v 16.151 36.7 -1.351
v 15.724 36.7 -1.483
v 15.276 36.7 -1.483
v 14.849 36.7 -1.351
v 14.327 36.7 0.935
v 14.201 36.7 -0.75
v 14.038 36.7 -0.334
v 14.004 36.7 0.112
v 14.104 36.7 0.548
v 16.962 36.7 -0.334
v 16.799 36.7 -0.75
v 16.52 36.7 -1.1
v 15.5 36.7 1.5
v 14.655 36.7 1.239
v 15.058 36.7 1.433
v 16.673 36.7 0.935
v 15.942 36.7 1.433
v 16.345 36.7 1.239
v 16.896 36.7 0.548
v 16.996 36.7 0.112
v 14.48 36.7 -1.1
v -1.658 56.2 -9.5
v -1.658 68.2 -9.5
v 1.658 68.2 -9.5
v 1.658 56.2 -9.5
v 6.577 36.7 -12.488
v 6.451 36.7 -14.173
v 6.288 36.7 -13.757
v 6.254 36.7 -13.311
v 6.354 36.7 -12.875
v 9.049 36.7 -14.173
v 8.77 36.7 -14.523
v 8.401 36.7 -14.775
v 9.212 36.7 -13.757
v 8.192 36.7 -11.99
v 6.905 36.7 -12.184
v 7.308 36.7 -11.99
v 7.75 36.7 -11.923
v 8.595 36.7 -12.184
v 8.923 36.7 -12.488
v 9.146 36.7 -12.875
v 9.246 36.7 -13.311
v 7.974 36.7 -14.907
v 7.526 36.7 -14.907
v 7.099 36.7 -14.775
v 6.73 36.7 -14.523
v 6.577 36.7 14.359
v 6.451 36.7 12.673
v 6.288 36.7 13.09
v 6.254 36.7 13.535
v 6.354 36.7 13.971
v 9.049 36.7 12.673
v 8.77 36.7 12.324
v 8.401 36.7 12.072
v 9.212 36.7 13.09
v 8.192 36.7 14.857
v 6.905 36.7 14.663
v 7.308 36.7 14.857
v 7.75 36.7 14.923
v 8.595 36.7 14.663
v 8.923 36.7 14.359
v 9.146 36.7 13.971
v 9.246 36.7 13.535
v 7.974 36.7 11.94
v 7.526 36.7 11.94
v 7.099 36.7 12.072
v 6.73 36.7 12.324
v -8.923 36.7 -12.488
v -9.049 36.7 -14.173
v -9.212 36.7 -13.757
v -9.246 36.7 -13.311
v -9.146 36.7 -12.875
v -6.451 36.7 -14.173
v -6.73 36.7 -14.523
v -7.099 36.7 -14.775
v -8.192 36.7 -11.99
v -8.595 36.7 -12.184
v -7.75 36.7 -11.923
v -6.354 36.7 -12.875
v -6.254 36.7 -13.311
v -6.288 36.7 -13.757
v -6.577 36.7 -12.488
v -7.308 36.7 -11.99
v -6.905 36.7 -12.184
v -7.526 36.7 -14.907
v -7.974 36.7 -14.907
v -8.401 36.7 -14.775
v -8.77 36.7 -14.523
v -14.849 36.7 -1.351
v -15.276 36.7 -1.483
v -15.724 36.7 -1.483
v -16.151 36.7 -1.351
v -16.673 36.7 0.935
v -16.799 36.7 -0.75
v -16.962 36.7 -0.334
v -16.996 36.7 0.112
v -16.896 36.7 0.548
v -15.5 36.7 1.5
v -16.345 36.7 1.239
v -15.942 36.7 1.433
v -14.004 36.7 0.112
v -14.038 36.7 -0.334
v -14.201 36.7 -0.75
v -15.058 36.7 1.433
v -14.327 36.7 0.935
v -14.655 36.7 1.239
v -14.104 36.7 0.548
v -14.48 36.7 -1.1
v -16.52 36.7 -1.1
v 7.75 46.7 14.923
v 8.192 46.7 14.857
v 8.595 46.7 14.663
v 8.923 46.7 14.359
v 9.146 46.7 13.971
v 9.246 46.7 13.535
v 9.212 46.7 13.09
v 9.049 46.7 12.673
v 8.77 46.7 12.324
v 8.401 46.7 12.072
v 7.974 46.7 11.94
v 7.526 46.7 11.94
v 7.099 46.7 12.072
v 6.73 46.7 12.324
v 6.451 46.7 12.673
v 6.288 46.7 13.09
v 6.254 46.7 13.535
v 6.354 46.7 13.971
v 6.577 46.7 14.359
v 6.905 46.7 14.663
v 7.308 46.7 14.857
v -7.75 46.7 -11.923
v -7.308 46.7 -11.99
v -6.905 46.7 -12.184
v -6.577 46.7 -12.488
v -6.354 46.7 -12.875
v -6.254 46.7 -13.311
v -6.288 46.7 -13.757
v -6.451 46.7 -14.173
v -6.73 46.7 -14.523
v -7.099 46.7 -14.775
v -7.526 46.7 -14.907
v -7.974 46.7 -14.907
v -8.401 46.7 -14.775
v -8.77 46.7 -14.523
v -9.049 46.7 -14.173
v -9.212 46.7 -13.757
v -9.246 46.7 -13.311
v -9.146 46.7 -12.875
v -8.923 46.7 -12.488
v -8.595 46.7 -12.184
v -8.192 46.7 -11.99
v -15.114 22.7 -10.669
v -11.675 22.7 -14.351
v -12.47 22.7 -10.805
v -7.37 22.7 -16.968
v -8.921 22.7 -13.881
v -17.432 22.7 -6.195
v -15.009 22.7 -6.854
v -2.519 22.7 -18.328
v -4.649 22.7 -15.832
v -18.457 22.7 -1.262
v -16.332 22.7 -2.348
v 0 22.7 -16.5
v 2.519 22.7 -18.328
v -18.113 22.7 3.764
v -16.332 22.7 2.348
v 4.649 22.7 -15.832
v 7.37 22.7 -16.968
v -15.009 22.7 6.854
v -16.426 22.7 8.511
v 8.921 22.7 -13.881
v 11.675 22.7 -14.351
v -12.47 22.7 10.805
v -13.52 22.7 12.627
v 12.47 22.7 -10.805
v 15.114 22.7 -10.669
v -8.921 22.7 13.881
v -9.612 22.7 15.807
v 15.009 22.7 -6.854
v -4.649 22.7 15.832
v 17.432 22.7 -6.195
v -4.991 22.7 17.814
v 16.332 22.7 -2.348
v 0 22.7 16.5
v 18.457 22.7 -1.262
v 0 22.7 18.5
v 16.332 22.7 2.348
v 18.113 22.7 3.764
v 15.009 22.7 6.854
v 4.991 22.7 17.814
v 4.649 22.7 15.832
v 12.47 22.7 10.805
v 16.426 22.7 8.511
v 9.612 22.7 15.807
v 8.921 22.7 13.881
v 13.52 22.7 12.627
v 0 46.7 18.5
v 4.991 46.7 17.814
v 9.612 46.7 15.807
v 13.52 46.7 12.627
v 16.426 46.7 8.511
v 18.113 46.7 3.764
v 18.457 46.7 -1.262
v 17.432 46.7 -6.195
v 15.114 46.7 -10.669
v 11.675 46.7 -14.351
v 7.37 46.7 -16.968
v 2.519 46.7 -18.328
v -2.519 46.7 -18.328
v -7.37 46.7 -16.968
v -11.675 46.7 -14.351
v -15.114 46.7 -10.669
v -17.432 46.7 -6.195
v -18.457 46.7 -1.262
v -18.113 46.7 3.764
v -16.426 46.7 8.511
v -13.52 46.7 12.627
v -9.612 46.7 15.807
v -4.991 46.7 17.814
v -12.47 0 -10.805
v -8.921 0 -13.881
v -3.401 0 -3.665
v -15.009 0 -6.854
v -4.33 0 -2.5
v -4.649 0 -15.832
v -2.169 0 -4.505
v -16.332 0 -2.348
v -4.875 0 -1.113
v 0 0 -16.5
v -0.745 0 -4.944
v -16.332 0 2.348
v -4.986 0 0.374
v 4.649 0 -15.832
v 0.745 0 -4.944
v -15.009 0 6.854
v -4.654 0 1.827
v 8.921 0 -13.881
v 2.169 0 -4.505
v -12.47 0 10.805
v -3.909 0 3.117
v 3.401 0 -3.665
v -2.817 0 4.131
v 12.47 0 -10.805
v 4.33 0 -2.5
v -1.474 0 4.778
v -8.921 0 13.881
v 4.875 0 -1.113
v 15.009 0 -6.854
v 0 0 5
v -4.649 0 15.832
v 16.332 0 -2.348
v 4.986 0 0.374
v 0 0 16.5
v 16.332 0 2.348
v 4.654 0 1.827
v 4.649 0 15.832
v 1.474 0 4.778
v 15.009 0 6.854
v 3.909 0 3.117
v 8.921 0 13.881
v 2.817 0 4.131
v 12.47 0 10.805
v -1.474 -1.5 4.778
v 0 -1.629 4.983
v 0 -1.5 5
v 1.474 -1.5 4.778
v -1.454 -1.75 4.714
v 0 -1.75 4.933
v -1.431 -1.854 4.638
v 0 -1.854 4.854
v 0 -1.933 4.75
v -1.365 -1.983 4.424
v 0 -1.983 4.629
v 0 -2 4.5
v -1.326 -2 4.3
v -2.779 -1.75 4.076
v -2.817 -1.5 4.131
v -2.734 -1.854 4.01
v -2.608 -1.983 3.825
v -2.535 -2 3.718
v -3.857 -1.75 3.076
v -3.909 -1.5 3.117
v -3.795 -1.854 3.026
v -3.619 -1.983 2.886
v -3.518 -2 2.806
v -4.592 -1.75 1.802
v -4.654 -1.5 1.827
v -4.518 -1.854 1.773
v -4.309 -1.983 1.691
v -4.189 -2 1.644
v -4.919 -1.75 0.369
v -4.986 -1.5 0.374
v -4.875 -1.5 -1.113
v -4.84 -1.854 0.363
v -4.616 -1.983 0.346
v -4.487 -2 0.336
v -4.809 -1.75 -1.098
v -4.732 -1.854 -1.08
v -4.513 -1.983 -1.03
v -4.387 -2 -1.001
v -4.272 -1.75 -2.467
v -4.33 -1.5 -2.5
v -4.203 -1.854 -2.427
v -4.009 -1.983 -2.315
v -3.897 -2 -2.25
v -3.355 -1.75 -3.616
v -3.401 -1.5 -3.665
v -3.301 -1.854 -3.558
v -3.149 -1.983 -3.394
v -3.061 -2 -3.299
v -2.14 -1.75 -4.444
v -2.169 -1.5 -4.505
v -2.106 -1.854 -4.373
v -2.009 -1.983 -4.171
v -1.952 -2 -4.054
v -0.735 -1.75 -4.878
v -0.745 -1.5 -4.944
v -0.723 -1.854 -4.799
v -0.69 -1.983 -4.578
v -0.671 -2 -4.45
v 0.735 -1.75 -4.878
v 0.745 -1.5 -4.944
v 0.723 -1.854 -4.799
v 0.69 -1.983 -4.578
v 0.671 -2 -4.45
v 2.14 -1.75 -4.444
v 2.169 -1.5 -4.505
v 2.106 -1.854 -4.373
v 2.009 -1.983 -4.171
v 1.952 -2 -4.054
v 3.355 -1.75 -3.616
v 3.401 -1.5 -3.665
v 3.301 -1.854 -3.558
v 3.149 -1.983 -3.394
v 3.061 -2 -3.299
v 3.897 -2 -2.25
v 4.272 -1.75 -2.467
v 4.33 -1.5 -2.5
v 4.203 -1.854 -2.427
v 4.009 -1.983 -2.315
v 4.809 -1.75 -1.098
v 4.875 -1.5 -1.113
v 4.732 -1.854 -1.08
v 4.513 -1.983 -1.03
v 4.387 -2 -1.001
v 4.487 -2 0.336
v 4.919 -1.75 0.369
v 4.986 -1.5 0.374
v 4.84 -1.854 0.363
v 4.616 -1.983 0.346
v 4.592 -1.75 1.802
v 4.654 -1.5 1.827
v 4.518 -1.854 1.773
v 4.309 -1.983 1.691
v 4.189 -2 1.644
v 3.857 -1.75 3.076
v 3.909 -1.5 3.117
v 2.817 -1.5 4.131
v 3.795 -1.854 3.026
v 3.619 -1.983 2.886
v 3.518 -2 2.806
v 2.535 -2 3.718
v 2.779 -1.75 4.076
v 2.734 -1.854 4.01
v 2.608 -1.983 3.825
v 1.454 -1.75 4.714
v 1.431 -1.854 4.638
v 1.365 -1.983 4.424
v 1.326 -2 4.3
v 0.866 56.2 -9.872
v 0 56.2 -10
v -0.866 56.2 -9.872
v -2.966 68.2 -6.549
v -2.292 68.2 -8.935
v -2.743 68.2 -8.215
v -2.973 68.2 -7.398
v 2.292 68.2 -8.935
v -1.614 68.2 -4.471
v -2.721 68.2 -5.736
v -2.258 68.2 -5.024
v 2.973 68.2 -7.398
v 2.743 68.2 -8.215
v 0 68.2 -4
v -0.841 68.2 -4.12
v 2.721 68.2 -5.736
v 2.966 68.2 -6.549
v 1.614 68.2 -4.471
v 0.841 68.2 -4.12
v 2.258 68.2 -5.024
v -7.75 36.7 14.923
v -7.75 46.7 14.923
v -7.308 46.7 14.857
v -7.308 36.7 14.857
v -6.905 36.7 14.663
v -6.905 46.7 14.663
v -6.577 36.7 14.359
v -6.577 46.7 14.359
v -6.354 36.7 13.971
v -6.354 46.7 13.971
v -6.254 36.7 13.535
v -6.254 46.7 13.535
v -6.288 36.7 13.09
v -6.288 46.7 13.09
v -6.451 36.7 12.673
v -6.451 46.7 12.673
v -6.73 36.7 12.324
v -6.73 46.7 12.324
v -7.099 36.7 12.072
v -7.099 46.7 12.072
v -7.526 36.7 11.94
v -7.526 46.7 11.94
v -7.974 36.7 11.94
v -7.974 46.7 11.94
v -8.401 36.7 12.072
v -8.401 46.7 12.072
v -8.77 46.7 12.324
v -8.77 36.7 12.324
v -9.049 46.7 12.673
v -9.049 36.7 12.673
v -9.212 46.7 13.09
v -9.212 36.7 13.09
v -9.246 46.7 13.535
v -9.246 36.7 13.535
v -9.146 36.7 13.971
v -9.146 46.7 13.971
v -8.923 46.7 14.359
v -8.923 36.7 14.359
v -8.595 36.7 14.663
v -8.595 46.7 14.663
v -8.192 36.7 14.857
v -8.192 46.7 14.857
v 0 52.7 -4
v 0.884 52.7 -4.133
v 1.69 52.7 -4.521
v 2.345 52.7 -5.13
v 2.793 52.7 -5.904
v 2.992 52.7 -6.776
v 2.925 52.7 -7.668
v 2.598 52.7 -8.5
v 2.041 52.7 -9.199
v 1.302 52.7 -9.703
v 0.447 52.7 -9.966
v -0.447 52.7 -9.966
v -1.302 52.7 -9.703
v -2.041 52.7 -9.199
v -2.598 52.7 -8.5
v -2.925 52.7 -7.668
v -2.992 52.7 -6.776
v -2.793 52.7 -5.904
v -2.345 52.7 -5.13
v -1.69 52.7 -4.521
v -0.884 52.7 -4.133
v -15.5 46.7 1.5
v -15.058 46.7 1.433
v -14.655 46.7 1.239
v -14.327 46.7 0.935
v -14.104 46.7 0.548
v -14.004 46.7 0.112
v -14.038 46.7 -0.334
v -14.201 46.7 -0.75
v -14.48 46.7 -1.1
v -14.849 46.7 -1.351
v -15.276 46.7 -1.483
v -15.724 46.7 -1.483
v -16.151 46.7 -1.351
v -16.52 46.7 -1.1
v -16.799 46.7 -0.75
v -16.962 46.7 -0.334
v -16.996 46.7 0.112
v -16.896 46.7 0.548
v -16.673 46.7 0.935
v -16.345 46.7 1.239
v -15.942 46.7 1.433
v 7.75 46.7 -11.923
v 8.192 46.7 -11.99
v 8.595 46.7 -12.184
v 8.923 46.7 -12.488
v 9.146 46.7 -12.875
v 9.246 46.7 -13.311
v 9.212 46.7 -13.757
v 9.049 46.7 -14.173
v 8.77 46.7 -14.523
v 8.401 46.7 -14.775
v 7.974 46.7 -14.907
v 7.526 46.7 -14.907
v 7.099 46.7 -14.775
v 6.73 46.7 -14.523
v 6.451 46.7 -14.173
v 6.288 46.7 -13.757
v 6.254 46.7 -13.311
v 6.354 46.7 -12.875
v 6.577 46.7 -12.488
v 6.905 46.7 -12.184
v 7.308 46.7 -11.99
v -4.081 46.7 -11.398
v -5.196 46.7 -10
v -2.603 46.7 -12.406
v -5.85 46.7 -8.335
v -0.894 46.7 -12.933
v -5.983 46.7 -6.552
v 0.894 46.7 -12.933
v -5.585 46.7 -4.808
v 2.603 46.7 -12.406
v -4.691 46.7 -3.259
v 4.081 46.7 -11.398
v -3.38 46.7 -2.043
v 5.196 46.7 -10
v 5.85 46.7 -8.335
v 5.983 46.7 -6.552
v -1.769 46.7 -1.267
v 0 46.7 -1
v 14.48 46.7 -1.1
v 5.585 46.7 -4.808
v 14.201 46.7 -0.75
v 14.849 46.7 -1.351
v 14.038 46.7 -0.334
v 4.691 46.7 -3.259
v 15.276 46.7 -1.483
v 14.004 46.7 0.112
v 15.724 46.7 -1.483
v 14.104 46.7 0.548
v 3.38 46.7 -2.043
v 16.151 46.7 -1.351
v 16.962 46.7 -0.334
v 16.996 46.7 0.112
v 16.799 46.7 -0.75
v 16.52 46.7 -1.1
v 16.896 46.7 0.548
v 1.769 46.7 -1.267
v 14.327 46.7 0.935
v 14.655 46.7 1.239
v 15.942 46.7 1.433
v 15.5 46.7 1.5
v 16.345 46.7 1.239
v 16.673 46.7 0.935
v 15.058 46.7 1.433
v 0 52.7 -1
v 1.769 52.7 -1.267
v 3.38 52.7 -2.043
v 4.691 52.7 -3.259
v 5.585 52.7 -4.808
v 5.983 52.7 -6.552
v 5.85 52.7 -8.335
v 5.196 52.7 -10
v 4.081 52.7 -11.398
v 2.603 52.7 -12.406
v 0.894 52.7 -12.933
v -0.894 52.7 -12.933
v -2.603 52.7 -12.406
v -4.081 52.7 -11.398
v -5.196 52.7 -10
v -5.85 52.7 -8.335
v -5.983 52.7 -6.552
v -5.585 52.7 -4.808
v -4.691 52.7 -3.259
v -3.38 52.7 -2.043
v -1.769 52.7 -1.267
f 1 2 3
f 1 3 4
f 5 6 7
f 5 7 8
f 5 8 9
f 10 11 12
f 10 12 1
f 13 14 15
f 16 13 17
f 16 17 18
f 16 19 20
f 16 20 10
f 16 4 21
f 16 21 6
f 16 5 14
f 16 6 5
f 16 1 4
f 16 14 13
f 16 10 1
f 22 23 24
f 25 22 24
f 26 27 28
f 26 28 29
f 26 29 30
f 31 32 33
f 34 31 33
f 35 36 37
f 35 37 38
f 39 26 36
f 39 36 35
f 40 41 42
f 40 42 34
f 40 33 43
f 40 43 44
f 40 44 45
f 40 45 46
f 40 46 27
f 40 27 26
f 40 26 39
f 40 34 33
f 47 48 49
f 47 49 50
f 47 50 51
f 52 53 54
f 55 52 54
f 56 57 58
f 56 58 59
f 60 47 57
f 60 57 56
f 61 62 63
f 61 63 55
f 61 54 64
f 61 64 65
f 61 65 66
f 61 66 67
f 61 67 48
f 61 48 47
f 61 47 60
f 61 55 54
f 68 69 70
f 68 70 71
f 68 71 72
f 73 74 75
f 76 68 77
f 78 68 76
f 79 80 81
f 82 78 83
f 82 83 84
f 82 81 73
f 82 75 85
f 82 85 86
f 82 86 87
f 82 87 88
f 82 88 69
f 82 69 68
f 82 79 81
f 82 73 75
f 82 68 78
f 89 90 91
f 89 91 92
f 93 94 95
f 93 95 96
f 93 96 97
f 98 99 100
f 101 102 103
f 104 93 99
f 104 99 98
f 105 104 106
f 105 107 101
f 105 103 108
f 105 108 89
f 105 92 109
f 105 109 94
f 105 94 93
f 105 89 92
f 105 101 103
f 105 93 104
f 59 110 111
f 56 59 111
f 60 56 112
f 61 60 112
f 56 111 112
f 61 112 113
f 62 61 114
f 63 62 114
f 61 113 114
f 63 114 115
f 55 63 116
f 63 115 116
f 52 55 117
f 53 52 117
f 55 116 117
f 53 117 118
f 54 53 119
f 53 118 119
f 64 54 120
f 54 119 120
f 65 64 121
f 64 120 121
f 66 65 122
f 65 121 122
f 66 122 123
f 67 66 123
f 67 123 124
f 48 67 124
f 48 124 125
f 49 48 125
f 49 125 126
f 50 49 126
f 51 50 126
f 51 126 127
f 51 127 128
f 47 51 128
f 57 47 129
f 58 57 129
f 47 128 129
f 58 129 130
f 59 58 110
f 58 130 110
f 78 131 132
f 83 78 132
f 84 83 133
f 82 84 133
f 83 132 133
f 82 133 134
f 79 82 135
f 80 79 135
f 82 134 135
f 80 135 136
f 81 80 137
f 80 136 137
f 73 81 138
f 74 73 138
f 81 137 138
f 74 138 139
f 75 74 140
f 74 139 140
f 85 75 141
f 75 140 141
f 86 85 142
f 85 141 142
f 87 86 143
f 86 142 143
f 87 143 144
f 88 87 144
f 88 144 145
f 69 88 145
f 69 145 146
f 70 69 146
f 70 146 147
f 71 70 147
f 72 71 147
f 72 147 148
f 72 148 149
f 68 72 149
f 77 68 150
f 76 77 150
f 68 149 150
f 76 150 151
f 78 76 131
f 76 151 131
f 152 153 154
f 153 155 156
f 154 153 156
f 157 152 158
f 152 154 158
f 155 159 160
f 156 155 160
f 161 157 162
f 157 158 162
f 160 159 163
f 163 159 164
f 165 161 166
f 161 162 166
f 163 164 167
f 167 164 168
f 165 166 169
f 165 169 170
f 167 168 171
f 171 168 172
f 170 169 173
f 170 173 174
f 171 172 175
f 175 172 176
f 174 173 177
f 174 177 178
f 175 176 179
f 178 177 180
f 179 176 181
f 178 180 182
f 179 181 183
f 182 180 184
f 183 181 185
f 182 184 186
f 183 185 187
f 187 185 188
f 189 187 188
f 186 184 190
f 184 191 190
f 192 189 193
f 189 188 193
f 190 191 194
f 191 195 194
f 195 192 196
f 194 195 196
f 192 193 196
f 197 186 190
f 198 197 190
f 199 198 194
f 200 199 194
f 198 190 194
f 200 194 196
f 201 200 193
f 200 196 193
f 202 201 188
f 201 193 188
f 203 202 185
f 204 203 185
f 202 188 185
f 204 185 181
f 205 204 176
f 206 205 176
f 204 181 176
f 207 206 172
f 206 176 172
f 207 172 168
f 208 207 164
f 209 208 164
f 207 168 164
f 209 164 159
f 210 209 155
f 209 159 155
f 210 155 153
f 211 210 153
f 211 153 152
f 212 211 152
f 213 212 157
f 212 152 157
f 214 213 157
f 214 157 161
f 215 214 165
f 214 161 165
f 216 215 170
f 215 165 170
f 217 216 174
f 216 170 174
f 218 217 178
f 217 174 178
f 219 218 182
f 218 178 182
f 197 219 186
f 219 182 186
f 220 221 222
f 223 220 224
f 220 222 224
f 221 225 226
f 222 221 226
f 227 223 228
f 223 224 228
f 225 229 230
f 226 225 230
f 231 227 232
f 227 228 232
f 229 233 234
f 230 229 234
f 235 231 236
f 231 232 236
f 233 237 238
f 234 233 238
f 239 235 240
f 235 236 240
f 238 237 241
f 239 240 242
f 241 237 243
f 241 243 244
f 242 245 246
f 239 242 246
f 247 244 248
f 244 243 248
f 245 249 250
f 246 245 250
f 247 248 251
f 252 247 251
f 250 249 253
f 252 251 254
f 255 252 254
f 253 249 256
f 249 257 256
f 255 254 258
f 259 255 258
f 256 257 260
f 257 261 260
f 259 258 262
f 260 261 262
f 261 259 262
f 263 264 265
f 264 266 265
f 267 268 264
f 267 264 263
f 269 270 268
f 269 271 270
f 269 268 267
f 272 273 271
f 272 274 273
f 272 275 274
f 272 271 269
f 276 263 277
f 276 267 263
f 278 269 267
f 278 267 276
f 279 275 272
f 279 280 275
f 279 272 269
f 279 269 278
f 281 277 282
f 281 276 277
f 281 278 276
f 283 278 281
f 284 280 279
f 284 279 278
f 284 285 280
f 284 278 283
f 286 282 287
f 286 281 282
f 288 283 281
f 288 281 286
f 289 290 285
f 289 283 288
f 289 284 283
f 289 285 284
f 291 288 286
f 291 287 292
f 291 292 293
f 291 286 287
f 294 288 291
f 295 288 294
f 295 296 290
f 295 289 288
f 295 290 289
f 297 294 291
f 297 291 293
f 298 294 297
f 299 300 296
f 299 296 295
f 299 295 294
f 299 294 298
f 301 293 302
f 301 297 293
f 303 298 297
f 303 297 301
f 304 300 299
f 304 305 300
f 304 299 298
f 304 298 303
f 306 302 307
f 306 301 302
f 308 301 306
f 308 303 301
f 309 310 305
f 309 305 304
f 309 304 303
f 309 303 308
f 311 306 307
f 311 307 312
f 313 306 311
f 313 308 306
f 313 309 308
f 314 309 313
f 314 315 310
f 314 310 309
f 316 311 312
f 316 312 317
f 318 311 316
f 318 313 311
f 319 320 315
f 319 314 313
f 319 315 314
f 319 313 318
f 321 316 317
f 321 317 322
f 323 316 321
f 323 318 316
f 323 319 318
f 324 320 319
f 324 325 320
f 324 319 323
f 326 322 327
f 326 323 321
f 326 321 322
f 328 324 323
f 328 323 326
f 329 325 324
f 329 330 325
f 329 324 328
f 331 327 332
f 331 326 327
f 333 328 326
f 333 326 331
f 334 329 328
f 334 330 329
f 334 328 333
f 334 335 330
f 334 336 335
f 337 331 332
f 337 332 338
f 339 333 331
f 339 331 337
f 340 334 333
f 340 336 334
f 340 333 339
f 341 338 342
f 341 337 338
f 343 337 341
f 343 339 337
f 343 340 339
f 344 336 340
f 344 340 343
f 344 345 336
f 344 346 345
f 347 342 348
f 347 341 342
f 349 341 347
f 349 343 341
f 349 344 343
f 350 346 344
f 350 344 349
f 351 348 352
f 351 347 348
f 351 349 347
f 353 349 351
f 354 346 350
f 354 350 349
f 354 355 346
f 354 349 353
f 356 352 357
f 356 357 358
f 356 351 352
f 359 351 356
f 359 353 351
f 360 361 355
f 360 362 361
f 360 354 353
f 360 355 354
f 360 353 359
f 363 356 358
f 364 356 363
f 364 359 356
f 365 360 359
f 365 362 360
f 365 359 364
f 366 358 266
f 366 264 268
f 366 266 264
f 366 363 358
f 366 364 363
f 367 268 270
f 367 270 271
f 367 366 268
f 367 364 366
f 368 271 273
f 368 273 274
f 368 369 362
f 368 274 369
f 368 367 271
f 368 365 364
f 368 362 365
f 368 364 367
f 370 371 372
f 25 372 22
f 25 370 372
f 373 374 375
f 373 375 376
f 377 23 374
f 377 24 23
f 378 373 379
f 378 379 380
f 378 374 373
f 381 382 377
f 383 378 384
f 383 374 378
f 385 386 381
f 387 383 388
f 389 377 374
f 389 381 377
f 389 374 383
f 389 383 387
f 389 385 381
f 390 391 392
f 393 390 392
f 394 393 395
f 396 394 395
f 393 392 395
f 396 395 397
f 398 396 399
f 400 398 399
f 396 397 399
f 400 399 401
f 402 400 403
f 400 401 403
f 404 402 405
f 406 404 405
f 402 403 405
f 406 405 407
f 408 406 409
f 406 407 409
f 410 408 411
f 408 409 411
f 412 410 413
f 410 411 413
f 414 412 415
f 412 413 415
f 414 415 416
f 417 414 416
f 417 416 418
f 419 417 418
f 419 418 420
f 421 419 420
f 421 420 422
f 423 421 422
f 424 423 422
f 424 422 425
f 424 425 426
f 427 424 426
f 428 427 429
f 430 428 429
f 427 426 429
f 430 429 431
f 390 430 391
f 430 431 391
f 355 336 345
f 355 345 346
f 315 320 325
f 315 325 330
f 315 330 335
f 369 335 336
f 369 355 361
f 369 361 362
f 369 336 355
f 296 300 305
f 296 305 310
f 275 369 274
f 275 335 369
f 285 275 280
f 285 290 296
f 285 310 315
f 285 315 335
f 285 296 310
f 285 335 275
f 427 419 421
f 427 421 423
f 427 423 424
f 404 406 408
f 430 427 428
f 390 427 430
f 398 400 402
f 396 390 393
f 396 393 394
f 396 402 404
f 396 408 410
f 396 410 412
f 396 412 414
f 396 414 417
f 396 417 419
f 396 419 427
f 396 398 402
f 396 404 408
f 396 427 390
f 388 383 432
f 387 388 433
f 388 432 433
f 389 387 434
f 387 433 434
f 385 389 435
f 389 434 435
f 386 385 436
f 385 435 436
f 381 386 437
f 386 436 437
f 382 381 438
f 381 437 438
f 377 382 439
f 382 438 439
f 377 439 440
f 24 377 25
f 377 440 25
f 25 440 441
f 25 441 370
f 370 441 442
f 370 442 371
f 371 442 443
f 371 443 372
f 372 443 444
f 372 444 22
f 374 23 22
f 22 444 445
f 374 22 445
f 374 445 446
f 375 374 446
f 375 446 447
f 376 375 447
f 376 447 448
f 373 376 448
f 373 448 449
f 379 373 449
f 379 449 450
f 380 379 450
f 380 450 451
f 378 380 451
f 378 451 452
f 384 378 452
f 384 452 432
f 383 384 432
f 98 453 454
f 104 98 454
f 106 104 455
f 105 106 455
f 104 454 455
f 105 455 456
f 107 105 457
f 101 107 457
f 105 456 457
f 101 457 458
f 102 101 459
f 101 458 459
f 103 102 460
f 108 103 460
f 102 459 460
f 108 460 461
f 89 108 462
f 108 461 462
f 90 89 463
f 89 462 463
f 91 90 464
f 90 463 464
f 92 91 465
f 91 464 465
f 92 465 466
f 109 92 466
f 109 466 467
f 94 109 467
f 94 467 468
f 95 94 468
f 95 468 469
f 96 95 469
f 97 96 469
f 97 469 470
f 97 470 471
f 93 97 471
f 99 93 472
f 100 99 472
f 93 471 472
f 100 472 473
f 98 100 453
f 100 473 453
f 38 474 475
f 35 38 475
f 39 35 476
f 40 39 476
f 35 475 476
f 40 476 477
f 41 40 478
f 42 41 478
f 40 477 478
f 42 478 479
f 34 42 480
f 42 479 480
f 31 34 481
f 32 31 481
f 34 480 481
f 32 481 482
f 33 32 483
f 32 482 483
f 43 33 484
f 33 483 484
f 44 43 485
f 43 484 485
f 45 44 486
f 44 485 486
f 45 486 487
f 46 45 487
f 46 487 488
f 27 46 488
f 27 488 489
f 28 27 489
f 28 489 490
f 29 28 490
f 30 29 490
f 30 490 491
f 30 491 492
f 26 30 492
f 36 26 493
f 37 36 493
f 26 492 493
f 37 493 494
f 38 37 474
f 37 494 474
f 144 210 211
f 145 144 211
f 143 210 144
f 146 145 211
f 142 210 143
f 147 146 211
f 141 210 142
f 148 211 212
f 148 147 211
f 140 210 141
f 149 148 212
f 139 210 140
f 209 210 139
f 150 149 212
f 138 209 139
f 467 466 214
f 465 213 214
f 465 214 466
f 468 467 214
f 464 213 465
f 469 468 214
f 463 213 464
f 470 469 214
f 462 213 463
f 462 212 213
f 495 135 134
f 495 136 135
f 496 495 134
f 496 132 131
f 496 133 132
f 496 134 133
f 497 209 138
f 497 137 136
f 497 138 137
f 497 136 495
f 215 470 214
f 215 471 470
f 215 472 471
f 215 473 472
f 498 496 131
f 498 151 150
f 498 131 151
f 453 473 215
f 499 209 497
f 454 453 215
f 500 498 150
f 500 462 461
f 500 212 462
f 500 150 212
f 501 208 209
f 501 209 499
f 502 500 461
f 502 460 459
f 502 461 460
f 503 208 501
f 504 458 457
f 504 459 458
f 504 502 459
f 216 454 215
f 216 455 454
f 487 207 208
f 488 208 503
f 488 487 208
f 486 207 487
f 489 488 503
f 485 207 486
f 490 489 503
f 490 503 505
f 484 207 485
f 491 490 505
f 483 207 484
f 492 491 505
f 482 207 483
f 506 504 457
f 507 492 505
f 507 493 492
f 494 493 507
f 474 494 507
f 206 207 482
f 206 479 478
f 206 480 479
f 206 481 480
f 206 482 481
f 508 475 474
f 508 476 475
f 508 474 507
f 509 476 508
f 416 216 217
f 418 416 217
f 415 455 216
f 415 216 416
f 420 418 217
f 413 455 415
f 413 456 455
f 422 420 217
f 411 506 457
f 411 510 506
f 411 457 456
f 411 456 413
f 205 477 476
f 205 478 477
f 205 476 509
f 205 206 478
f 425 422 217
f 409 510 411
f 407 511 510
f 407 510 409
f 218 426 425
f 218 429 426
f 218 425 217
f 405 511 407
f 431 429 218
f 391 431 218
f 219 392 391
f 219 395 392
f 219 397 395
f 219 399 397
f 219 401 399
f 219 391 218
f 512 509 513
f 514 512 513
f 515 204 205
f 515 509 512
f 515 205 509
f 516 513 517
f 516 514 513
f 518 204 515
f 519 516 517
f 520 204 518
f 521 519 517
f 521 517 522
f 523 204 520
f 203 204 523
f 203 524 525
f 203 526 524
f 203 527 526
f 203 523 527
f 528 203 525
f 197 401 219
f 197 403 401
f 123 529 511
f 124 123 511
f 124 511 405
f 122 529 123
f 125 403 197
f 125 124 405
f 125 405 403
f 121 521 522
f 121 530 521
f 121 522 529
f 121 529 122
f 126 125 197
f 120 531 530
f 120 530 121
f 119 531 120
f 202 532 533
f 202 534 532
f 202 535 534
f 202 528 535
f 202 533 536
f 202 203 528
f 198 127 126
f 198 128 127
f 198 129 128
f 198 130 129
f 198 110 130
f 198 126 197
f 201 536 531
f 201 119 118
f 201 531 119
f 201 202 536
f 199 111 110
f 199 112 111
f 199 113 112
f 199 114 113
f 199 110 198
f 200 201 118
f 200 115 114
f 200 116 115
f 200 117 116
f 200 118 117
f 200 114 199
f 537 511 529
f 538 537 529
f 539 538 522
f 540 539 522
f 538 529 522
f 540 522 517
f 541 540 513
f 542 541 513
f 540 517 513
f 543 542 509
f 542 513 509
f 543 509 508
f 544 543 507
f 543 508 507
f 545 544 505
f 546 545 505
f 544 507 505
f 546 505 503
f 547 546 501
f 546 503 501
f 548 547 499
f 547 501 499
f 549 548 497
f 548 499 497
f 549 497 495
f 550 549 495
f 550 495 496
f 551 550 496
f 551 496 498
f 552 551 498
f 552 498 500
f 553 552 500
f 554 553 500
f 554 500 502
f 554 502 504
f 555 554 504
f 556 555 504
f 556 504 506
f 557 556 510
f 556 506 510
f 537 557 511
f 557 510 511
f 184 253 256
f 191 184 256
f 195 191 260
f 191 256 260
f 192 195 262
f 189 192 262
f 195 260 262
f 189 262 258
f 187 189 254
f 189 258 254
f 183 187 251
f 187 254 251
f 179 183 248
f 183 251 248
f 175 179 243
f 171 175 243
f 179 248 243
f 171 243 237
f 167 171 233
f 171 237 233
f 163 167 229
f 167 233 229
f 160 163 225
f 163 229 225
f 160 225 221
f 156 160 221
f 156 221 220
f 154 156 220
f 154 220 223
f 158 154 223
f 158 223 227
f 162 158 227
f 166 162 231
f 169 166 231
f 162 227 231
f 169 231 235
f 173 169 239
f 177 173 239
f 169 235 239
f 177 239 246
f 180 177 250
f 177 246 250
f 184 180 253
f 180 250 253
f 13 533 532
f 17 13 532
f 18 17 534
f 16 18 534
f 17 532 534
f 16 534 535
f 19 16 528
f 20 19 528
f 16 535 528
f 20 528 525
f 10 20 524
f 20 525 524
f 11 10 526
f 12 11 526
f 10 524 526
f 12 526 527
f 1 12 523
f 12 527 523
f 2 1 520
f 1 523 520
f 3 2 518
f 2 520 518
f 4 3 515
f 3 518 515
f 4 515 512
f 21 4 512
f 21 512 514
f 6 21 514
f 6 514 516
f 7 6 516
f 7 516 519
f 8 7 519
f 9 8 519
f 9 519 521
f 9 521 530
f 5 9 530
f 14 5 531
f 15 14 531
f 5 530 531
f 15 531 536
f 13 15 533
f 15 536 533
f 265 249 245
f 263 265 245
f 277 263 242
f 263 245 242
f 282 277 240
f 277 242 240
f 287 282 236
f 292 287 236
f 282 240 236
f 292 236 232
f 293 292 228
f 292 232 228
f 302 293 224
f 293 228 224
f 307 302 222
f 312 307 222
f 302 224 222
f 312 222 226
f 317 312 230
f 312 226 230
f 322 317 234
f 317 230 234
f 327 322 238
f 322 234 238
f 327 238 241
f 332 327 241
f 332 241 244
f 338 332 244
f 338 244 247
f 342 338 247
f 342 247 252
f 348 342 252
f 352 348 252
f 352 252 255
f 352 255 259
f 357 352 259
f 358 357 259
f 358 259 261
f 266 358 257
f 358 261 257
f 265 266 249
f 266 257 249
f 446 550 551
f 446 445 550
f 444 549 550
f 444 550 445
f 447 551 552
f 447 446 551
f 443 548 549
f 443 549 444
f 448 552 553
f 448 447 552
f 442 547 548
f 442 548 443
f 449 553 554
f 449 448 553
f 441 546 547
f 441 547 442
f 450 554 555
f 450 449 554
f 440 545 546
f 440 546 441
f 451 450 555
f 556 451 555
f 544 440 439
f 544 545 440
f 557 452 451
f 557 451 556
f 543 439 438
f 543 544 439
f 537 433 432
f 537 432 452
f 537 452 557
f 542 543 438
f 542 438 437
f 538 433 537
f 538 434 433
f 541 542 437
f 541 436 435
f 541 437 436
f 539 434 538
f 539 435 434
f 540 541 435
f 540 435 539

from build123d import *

# Parameters (mm, degrees)
SKETCH_1_R          = 16.5
EXTRUDE_1_DEPTH     = 22.7
SKETCH_2_R          = 18.5
EXTRUDE_2_DEPTH     = 24
SKETCH_3_R          = 6
EXTRUDE_3_DEPTH     = 6
SKETCH_4_R          = 3
EXTRUDE_4_DEPTH     = 15.5
CUT_EXTRUDE_1_DEPTH = 12
SKETCH_6_R          = 1.5
CUT_EXTRUDE_2_DEPTH = 10
SKETCH_7_R          = 5
EXTRUDE_5_DEPTH     = 2
FILLET_1_R          = 0.5


with BuildPart() as part:
    # 草图1 → 凸台-拉伸1 (new body)
    with BuildSketch(Plane(origin=(0, 0, 0), x_dir=(1, 0, 0), z_dir=(0, 1, 0))):
        with Locations(Location((0, 0, 0), (0, 0, 270))):
            Circle(SKETCH_1_R)
    extrude(amount=EXTRUDE_1_DEPTH)

    # 草图2 → 凸台-拉伸2 (add)
    with BuildSketch(Plane(origin=(0, 22.7, 0), x_dir=(1, 0, 0), z_dir=(0, 1, 0))):
        with Locations(Location((0, 0, 0), (0, 0, 270))):
            Circle(SKETCH_2_R)
    extrude(amount=EXTRUDE_2_DEPTH)

    # 草图3 → 凸台-拉伸3 (add)
    with BuildSketch(Plane(origin=(0, 46.7, 0), x_dir=(1, 0, 0), z_dir=(0, 1, 0))):
        with Locations(Location((0, 7, 0), (0, 0, 270))):
            Circle(SKETCH_3_R)
    extrude(amount=EXTRUDE_3_DEPTH)

    # 草图4 → 凸台-拉伸4 (add)
    with BuildSketch(Plane(origin=(0, 52.7, 0), x_dir=(1, 0, 0), z_dir=(0, 1, 0))):
        with Locations(Location((0, 7, 0), (0, 0, 270))):
            Circle(SKETCH_4_R)
    extrude(amount=EXTRUDE_4_DEPTH)

    # 草图5 → 切除-拉伸1 (cut)
    with BuildSketch(Plane(origin=(0, 68.2, 0), x_dir=(1, 0, 0), z_dir=(0, 1, 0))):
        Polygon((-80.661429966, 9.5), (-1.658312395, 9.5), (1.658312395, 9.5), (80.661429966, 9.5), (80.661429966, 167.506235142), (-80.661429966, 167.506235142), align=None)
    extrude(amount=-CUT_EXTRUDE_1_DEPTH, mode=Mode.SUBTRACT)

    # 草图6 → 切除-拉伸2 (cut)
    with BuildSketch(Plane(origin=(0, 46.7, 0), x_dir=(1, 0, 0), z_dir=(0, 1, 0))):
        with Locations(Location((15.5, 0, 0), (0, 0, 270))):
            Circle(SKETCH_6_R)
        with Locations(Location((7.75, -13.423393759, 0), (0, 0, 270))):
            Circle(SKETCH_6_R)
        with Locations(Location((-7.75, -13.423393759, 0), (0, 0, 270))):
            Circle(SKETCH_6_R)
        with Locations(Location((-15.5, 0, 0), (0, 0, 270))):
            Circle(SKETCH_6_R)
        with Locations(Location((-7.75, 13.423393759, 0), (0, 0, 270))):
            Circle(SKETCH_6_R)
        with Locations(Location((7.75, 13.423393759, 0), (0, 0, 270))):
            Circle(SKETCH_6_R)
    extrude(amount=-CUT_EXTRUDE_2_DEPTH, mode=Mode.SUBTRACT)

    # 草图7 → 凸台-拉伸5 (add)
    with BuildSketch(Plane.XZ):
        with Locations(Location((0, 0, 0), (0, 0, 90))):
            Circle(SKETCH_7_R)
    extrude(amount=EXTRUDE_5_DEPTH)

    # 圆角1
    fillet_1_edges = [part.edges().sort_by_distance(p)[0] for p in [
        (0, -2, -5),
    ]]
    fillet(fillet_1_edges, radius=FILLET_1_R)


solid = part.part
